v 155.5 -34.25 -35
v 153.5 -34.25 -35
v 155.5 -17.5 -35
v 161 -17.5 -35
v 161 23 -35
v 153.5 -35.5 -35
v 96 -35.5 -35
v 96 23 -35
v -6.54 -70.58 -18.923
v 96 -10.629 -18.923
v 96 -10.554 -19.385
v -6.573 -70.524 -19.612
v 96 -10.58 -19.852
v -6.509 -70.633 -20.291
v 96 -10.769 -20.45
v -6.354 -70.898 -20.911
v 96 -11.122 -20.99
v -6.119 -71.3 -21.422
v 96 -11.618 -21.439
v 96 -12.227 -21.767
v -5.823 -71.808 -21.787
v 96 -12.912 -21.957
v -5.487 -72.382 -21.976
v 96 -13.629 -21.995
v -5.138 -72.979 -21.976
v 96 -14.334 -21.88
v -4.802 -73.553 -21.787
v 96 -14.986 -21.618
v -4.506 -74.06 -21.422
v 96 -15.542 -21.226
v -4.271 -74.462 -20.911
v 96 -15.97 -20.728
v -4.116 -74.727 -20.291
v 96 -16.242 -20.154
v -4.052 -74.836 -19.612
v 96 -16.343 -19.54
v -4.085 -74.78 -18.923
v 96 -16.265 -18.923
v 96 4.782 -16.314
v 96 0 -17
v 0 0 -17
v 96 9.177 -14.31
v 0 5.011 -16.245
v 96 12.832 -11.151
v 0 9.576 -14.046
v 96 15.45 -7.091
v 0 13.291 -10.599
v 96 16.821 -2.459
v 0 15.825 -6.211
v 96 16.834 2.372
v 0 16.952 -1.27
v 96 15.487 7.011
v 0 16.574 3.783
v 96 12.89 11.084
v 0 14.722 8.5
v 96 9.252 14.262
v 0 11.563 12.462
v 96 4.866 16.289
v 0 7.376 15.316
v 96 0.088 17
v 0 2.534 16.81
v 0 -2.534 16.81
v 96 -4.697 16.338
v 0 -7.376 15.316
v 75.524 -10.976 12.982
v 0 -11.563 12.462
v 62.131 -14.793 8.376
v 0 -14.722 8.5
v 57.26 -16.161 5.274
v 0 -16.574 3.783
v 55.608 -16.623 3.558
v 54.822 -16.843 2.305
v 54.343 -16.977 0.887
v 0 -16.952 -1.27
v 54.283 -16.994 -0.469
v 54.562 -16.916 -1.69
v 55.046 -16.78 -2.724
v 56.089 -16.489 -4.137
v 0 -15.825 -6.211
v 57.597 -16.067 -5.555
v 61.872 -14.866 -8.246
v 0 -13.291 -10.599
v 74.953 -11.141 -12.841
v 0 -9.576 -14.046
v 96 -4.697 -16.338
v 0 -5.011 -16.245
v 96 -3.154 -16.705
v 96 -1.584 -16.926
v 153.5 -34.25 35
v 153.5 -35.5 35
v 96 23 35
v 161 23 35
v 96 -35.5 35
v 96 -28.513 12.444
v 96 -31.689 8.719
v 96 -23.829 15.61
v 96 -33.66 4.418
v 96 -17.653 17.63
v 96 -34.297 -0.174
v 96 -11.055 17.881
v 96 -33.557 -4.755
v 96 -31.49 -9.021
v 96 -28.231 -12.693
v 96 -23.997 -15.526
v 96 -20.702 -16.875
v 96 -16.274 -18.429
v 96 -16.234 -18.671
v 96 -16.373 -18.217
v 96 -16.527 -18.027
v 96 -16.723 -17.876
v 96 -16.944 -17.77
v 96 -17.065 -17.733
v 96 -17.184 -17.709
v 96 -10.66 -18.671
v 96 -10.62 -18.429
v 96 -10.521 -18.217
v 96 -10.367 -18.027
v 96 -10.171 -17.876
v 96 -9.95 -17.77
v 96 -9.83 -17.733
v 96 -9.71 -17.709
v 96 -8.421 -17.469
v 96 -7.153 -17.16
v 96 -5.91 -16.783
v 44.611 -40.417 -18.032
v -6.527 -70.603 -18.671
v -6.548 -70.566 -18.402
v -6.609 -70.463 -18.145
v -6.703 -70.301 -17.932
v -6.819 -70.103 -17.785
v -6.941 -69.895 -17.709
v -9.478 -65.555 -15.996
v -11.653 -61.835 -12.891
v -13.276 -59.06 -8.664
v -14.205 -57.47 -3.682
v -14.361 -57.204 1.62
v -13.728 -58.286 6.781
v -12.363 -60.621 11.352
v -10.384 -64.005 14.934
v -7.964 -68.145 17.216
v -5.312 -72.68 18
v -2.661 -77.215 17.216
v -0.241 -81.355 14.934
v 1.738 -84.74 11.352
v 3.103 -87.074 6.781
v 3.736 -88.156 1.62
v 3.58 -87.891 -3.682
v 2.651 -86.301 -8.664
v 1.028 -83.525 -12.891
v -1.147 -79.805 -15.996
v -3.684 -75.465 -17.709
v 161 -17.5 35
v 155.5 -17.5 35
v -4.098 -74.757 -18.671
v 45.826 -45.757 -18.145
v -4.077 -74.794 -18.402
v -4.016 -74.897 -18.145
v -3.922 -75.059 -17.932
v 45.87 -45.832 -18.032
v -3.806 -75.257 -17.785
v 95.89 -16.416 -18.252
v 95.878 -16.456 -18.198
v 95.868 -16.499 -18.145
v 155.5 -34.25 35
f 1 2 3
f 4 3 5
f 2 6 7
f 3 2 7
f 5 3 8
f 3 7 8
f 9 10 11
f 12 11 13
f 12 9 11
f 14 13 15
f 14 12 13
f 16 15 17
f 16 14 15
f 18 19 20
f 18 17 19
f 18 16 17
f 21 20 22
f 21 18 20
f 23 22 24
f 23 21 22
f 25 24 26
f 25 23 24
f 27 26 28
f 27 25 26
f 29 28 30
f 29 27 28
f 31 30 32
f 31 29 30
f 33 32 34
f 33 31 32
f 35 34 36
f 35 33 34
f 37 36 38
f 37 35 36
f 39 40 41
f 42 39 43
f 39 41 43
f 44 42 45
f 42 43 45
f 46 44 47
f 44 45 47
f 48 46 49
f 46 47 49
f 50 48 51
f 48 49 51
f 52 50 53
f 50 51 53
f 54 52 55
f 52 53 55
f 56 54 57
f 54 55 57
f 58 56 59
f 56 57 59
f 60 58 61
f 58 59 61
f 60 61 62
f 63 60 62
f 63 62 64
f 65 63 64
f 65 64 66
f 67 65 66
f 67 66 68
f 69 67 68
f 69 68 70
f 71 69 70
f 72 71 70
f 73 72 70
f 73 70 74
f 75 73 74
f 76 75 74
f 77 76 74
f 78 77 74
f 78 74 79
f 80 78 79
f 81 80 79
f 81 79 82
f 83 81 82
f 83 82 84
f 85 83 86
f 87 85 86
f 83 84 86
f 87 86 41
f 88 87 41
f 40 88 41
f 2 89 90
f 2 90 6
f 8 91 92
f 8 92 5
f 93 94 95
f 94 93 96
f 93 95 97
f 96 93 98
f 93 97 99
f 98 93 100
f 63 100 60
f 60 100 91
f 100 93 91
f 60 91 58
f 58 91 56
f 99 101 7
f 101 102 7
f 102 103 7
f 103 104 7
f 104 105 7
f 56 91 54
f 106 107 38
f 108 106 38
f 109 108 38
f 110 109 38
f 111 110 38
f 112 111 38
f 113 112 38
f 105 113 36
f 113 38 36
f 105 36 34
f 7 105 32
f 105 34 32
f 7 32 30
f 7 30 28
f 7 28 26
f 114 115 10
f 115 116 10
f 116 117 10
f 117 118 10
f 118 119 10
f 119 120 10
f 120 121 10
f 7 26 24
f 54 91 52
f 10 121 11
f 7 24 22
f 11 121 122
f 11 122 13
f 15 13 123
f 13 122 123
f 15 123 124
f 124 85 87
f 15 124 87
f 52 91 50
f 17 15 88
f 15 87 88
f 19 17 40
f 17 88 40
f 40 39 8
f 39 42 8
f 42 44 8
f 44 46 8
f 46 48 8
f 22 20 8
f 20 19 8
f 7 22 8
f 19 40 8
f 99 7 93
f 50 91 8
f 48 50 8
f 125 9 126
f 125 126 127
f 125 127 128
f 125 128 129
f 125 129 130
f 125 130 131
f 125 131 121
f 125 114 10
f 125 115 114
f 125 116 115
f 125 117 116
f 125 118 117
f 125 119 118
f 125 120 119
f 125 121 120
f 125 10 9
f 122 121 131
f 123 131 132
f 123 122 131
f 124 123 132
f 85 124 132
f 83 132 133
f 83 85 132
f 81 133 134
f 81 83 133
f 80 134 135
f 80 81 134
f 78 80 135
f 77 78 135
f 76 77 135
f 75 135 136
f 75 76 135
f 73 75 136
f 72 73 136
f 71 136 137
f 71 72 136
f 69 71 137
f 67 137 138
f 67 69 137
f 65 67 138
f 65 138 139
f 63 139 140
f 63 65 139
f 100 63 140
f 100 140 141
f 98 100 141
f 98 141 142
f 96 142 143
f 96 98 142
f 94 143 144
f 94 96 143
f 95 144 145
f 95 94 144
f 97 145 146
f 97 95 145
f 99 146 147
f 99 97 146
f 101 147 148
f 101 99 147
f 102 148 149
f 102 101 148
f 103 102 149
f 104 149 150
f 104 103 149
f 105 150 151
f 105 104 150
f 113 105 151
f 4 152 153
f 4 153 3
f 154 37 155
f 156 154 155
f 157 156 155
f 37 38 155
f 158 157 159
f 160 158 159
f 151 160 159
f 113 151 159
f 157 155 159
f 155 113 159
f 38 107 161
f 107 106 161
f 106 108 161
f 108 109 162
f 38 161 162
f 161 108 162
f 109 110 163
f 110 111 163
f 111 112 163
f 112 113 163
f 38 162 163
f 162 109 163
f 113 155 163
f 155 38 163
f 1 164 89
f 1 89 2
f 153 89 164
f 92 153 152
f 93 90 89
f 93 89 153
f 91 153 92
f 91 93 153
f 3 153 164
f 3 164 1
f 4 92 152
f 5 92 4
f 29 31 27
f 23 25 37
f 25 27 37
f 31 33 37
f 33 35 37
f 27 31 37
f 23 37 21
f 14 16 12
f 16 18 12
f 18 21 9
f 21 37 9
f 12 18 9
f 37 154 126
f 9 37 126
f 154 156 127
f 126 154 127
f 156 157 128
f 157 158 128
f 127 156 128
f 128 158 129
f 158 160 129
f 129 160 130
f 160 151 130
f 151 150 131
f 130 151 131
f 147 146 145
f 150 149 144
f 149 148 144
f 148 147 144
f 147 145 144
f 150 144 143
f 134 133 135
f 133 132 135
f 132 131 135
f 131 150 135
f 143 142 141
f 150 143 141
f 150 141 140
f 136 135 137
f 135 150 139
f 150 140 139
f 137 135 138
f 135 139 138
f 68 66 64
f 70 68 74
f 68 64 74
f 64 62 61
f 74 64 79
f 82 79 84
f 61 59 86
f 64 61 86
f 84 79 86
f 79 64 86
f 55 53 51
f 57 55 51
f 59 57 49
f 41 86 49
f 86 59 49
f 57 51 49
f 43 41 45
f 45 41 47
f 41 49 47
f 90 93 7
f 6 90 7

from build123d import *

# Parameters (mm, degrees)
ESQUISSE1_R             = 17
BOSS_EXTRU_1_DEPTH      = 96
ESQUISSE2_W             = 70
ESQUISSE2_H             = 58.5
BOSS_EXTRU_3_DEPTH      = 65
ESQUISSE6_R             = 18
BOSS_EXTRU_4_DEPTH      = 144
ESQUISSE7_W             = 70
ESQUISSE7_H             = 18
ENL_V_MAT_EXTRU_1_DEPTH = 5.5
ESQUISSE8_W             = 70
ESQUISSE8_H             = 1.25
ENL_V_MAT_EXTRU_2_DEPTH = 2
ESQUISSE9_R             = 2.5
BOSS_EXTRU_5_DEPTH      = 120
CONG_1_R                = 1


with BuildPart() as part:
    # Esquisse1 → Boss.-Extru.1 (new body)
    with BuildSketch(Plane(origin=(0, 0, 0), x_dir=(0, 0, -1), z_dir=(1, 0, 0))):
        Circle(ESQUISSE1_R)
    extrude(amount=BOSS_EXTRU_1_DEPTH)

    # Esquisse2 → Boss.-Extru.3 (add)
    with BuildSketch(Plane(origin=(96, 0, 0), x_dir=(0, 0, -1), z_dir=(1, 0, 0))):
        with Locations((0, -6.25)):
            Rectangle(ESQUISSE2_W, ESQUISSE2_H)
    extrude(amount=BOSS_EXTRU_3_DEPTH)

    # Esquisse6 → Boss.-Extru.4 (add)
    with BuildSketch(Plane(origin=(88.685287476, 51.850448358, 0), x_dir=(0, 0, -1), z_dir=(0.8632812499999999, 0.5047231750162041, 0))):
        with Locations(Location((0, -60.062057827, 0), (0, 0, 90))):
            Circle(ESQUISSE6_R)
    extrude(amount=-BOSS_EXTRU_4_DEPTH)

    # Esquisse7 → Enlèv. mat.-Extru.1 (cut)
    with BuildSketch(Plane(origin=(161, 0, 0), x_dir=(0, 0, -1), z_dir=(1, 0, 0))):
        with Locations((0, -26.5)):
            Rectangle(ESQUISSE7_W, ESQUISSE7_H)
    extrude(amount=-ENL_V_MAT_EXTRU_1_DEPTH, mode=Mode.SUBTRACT)

    # Esquisse8 → Enlèv. mat.-Extru.2 (cut)
    with BuildSketch(Plane(origin=(155.5, 0, 0), x_dir=(0, 0, -1), z_dir=(1, 0, 0))):
        with Locations((0, -34.875)):
            Rectangle(ESQUISSE8_W, ESQUISSE8_H)
    extrude(amount=-ENL_V_MAT_EXTRU_2_DEPTH, mode=Mode.SUBTRACT)

    # Esquisse9 → Boss.-Extru.5 (add)
    with BuildSketch(Plane(origin=(-35.627212524, -20.829688844, 0), x_dir=(0, 0, 1), z_dir=(-0.8632812499999999, -0.5047231750162042, 0))):
        with Locations((-19.5, -60.062057827)):
            Circle(ESQUISSE9_R)
    extrude(amount=-BOSS_EXTRU_5_DEPTH)

    # Congé1
    cong_1_edges = [part.edges().sort_by_distance(p)[0] for p in [
        (44.859518924, -41.124048908, -17.897435897),
        (45.827981076, -45.003192614, -17.897435897),
    ]]
    fillet(cong_1_edges, radius=CONG_1_R)


solid = part.part
